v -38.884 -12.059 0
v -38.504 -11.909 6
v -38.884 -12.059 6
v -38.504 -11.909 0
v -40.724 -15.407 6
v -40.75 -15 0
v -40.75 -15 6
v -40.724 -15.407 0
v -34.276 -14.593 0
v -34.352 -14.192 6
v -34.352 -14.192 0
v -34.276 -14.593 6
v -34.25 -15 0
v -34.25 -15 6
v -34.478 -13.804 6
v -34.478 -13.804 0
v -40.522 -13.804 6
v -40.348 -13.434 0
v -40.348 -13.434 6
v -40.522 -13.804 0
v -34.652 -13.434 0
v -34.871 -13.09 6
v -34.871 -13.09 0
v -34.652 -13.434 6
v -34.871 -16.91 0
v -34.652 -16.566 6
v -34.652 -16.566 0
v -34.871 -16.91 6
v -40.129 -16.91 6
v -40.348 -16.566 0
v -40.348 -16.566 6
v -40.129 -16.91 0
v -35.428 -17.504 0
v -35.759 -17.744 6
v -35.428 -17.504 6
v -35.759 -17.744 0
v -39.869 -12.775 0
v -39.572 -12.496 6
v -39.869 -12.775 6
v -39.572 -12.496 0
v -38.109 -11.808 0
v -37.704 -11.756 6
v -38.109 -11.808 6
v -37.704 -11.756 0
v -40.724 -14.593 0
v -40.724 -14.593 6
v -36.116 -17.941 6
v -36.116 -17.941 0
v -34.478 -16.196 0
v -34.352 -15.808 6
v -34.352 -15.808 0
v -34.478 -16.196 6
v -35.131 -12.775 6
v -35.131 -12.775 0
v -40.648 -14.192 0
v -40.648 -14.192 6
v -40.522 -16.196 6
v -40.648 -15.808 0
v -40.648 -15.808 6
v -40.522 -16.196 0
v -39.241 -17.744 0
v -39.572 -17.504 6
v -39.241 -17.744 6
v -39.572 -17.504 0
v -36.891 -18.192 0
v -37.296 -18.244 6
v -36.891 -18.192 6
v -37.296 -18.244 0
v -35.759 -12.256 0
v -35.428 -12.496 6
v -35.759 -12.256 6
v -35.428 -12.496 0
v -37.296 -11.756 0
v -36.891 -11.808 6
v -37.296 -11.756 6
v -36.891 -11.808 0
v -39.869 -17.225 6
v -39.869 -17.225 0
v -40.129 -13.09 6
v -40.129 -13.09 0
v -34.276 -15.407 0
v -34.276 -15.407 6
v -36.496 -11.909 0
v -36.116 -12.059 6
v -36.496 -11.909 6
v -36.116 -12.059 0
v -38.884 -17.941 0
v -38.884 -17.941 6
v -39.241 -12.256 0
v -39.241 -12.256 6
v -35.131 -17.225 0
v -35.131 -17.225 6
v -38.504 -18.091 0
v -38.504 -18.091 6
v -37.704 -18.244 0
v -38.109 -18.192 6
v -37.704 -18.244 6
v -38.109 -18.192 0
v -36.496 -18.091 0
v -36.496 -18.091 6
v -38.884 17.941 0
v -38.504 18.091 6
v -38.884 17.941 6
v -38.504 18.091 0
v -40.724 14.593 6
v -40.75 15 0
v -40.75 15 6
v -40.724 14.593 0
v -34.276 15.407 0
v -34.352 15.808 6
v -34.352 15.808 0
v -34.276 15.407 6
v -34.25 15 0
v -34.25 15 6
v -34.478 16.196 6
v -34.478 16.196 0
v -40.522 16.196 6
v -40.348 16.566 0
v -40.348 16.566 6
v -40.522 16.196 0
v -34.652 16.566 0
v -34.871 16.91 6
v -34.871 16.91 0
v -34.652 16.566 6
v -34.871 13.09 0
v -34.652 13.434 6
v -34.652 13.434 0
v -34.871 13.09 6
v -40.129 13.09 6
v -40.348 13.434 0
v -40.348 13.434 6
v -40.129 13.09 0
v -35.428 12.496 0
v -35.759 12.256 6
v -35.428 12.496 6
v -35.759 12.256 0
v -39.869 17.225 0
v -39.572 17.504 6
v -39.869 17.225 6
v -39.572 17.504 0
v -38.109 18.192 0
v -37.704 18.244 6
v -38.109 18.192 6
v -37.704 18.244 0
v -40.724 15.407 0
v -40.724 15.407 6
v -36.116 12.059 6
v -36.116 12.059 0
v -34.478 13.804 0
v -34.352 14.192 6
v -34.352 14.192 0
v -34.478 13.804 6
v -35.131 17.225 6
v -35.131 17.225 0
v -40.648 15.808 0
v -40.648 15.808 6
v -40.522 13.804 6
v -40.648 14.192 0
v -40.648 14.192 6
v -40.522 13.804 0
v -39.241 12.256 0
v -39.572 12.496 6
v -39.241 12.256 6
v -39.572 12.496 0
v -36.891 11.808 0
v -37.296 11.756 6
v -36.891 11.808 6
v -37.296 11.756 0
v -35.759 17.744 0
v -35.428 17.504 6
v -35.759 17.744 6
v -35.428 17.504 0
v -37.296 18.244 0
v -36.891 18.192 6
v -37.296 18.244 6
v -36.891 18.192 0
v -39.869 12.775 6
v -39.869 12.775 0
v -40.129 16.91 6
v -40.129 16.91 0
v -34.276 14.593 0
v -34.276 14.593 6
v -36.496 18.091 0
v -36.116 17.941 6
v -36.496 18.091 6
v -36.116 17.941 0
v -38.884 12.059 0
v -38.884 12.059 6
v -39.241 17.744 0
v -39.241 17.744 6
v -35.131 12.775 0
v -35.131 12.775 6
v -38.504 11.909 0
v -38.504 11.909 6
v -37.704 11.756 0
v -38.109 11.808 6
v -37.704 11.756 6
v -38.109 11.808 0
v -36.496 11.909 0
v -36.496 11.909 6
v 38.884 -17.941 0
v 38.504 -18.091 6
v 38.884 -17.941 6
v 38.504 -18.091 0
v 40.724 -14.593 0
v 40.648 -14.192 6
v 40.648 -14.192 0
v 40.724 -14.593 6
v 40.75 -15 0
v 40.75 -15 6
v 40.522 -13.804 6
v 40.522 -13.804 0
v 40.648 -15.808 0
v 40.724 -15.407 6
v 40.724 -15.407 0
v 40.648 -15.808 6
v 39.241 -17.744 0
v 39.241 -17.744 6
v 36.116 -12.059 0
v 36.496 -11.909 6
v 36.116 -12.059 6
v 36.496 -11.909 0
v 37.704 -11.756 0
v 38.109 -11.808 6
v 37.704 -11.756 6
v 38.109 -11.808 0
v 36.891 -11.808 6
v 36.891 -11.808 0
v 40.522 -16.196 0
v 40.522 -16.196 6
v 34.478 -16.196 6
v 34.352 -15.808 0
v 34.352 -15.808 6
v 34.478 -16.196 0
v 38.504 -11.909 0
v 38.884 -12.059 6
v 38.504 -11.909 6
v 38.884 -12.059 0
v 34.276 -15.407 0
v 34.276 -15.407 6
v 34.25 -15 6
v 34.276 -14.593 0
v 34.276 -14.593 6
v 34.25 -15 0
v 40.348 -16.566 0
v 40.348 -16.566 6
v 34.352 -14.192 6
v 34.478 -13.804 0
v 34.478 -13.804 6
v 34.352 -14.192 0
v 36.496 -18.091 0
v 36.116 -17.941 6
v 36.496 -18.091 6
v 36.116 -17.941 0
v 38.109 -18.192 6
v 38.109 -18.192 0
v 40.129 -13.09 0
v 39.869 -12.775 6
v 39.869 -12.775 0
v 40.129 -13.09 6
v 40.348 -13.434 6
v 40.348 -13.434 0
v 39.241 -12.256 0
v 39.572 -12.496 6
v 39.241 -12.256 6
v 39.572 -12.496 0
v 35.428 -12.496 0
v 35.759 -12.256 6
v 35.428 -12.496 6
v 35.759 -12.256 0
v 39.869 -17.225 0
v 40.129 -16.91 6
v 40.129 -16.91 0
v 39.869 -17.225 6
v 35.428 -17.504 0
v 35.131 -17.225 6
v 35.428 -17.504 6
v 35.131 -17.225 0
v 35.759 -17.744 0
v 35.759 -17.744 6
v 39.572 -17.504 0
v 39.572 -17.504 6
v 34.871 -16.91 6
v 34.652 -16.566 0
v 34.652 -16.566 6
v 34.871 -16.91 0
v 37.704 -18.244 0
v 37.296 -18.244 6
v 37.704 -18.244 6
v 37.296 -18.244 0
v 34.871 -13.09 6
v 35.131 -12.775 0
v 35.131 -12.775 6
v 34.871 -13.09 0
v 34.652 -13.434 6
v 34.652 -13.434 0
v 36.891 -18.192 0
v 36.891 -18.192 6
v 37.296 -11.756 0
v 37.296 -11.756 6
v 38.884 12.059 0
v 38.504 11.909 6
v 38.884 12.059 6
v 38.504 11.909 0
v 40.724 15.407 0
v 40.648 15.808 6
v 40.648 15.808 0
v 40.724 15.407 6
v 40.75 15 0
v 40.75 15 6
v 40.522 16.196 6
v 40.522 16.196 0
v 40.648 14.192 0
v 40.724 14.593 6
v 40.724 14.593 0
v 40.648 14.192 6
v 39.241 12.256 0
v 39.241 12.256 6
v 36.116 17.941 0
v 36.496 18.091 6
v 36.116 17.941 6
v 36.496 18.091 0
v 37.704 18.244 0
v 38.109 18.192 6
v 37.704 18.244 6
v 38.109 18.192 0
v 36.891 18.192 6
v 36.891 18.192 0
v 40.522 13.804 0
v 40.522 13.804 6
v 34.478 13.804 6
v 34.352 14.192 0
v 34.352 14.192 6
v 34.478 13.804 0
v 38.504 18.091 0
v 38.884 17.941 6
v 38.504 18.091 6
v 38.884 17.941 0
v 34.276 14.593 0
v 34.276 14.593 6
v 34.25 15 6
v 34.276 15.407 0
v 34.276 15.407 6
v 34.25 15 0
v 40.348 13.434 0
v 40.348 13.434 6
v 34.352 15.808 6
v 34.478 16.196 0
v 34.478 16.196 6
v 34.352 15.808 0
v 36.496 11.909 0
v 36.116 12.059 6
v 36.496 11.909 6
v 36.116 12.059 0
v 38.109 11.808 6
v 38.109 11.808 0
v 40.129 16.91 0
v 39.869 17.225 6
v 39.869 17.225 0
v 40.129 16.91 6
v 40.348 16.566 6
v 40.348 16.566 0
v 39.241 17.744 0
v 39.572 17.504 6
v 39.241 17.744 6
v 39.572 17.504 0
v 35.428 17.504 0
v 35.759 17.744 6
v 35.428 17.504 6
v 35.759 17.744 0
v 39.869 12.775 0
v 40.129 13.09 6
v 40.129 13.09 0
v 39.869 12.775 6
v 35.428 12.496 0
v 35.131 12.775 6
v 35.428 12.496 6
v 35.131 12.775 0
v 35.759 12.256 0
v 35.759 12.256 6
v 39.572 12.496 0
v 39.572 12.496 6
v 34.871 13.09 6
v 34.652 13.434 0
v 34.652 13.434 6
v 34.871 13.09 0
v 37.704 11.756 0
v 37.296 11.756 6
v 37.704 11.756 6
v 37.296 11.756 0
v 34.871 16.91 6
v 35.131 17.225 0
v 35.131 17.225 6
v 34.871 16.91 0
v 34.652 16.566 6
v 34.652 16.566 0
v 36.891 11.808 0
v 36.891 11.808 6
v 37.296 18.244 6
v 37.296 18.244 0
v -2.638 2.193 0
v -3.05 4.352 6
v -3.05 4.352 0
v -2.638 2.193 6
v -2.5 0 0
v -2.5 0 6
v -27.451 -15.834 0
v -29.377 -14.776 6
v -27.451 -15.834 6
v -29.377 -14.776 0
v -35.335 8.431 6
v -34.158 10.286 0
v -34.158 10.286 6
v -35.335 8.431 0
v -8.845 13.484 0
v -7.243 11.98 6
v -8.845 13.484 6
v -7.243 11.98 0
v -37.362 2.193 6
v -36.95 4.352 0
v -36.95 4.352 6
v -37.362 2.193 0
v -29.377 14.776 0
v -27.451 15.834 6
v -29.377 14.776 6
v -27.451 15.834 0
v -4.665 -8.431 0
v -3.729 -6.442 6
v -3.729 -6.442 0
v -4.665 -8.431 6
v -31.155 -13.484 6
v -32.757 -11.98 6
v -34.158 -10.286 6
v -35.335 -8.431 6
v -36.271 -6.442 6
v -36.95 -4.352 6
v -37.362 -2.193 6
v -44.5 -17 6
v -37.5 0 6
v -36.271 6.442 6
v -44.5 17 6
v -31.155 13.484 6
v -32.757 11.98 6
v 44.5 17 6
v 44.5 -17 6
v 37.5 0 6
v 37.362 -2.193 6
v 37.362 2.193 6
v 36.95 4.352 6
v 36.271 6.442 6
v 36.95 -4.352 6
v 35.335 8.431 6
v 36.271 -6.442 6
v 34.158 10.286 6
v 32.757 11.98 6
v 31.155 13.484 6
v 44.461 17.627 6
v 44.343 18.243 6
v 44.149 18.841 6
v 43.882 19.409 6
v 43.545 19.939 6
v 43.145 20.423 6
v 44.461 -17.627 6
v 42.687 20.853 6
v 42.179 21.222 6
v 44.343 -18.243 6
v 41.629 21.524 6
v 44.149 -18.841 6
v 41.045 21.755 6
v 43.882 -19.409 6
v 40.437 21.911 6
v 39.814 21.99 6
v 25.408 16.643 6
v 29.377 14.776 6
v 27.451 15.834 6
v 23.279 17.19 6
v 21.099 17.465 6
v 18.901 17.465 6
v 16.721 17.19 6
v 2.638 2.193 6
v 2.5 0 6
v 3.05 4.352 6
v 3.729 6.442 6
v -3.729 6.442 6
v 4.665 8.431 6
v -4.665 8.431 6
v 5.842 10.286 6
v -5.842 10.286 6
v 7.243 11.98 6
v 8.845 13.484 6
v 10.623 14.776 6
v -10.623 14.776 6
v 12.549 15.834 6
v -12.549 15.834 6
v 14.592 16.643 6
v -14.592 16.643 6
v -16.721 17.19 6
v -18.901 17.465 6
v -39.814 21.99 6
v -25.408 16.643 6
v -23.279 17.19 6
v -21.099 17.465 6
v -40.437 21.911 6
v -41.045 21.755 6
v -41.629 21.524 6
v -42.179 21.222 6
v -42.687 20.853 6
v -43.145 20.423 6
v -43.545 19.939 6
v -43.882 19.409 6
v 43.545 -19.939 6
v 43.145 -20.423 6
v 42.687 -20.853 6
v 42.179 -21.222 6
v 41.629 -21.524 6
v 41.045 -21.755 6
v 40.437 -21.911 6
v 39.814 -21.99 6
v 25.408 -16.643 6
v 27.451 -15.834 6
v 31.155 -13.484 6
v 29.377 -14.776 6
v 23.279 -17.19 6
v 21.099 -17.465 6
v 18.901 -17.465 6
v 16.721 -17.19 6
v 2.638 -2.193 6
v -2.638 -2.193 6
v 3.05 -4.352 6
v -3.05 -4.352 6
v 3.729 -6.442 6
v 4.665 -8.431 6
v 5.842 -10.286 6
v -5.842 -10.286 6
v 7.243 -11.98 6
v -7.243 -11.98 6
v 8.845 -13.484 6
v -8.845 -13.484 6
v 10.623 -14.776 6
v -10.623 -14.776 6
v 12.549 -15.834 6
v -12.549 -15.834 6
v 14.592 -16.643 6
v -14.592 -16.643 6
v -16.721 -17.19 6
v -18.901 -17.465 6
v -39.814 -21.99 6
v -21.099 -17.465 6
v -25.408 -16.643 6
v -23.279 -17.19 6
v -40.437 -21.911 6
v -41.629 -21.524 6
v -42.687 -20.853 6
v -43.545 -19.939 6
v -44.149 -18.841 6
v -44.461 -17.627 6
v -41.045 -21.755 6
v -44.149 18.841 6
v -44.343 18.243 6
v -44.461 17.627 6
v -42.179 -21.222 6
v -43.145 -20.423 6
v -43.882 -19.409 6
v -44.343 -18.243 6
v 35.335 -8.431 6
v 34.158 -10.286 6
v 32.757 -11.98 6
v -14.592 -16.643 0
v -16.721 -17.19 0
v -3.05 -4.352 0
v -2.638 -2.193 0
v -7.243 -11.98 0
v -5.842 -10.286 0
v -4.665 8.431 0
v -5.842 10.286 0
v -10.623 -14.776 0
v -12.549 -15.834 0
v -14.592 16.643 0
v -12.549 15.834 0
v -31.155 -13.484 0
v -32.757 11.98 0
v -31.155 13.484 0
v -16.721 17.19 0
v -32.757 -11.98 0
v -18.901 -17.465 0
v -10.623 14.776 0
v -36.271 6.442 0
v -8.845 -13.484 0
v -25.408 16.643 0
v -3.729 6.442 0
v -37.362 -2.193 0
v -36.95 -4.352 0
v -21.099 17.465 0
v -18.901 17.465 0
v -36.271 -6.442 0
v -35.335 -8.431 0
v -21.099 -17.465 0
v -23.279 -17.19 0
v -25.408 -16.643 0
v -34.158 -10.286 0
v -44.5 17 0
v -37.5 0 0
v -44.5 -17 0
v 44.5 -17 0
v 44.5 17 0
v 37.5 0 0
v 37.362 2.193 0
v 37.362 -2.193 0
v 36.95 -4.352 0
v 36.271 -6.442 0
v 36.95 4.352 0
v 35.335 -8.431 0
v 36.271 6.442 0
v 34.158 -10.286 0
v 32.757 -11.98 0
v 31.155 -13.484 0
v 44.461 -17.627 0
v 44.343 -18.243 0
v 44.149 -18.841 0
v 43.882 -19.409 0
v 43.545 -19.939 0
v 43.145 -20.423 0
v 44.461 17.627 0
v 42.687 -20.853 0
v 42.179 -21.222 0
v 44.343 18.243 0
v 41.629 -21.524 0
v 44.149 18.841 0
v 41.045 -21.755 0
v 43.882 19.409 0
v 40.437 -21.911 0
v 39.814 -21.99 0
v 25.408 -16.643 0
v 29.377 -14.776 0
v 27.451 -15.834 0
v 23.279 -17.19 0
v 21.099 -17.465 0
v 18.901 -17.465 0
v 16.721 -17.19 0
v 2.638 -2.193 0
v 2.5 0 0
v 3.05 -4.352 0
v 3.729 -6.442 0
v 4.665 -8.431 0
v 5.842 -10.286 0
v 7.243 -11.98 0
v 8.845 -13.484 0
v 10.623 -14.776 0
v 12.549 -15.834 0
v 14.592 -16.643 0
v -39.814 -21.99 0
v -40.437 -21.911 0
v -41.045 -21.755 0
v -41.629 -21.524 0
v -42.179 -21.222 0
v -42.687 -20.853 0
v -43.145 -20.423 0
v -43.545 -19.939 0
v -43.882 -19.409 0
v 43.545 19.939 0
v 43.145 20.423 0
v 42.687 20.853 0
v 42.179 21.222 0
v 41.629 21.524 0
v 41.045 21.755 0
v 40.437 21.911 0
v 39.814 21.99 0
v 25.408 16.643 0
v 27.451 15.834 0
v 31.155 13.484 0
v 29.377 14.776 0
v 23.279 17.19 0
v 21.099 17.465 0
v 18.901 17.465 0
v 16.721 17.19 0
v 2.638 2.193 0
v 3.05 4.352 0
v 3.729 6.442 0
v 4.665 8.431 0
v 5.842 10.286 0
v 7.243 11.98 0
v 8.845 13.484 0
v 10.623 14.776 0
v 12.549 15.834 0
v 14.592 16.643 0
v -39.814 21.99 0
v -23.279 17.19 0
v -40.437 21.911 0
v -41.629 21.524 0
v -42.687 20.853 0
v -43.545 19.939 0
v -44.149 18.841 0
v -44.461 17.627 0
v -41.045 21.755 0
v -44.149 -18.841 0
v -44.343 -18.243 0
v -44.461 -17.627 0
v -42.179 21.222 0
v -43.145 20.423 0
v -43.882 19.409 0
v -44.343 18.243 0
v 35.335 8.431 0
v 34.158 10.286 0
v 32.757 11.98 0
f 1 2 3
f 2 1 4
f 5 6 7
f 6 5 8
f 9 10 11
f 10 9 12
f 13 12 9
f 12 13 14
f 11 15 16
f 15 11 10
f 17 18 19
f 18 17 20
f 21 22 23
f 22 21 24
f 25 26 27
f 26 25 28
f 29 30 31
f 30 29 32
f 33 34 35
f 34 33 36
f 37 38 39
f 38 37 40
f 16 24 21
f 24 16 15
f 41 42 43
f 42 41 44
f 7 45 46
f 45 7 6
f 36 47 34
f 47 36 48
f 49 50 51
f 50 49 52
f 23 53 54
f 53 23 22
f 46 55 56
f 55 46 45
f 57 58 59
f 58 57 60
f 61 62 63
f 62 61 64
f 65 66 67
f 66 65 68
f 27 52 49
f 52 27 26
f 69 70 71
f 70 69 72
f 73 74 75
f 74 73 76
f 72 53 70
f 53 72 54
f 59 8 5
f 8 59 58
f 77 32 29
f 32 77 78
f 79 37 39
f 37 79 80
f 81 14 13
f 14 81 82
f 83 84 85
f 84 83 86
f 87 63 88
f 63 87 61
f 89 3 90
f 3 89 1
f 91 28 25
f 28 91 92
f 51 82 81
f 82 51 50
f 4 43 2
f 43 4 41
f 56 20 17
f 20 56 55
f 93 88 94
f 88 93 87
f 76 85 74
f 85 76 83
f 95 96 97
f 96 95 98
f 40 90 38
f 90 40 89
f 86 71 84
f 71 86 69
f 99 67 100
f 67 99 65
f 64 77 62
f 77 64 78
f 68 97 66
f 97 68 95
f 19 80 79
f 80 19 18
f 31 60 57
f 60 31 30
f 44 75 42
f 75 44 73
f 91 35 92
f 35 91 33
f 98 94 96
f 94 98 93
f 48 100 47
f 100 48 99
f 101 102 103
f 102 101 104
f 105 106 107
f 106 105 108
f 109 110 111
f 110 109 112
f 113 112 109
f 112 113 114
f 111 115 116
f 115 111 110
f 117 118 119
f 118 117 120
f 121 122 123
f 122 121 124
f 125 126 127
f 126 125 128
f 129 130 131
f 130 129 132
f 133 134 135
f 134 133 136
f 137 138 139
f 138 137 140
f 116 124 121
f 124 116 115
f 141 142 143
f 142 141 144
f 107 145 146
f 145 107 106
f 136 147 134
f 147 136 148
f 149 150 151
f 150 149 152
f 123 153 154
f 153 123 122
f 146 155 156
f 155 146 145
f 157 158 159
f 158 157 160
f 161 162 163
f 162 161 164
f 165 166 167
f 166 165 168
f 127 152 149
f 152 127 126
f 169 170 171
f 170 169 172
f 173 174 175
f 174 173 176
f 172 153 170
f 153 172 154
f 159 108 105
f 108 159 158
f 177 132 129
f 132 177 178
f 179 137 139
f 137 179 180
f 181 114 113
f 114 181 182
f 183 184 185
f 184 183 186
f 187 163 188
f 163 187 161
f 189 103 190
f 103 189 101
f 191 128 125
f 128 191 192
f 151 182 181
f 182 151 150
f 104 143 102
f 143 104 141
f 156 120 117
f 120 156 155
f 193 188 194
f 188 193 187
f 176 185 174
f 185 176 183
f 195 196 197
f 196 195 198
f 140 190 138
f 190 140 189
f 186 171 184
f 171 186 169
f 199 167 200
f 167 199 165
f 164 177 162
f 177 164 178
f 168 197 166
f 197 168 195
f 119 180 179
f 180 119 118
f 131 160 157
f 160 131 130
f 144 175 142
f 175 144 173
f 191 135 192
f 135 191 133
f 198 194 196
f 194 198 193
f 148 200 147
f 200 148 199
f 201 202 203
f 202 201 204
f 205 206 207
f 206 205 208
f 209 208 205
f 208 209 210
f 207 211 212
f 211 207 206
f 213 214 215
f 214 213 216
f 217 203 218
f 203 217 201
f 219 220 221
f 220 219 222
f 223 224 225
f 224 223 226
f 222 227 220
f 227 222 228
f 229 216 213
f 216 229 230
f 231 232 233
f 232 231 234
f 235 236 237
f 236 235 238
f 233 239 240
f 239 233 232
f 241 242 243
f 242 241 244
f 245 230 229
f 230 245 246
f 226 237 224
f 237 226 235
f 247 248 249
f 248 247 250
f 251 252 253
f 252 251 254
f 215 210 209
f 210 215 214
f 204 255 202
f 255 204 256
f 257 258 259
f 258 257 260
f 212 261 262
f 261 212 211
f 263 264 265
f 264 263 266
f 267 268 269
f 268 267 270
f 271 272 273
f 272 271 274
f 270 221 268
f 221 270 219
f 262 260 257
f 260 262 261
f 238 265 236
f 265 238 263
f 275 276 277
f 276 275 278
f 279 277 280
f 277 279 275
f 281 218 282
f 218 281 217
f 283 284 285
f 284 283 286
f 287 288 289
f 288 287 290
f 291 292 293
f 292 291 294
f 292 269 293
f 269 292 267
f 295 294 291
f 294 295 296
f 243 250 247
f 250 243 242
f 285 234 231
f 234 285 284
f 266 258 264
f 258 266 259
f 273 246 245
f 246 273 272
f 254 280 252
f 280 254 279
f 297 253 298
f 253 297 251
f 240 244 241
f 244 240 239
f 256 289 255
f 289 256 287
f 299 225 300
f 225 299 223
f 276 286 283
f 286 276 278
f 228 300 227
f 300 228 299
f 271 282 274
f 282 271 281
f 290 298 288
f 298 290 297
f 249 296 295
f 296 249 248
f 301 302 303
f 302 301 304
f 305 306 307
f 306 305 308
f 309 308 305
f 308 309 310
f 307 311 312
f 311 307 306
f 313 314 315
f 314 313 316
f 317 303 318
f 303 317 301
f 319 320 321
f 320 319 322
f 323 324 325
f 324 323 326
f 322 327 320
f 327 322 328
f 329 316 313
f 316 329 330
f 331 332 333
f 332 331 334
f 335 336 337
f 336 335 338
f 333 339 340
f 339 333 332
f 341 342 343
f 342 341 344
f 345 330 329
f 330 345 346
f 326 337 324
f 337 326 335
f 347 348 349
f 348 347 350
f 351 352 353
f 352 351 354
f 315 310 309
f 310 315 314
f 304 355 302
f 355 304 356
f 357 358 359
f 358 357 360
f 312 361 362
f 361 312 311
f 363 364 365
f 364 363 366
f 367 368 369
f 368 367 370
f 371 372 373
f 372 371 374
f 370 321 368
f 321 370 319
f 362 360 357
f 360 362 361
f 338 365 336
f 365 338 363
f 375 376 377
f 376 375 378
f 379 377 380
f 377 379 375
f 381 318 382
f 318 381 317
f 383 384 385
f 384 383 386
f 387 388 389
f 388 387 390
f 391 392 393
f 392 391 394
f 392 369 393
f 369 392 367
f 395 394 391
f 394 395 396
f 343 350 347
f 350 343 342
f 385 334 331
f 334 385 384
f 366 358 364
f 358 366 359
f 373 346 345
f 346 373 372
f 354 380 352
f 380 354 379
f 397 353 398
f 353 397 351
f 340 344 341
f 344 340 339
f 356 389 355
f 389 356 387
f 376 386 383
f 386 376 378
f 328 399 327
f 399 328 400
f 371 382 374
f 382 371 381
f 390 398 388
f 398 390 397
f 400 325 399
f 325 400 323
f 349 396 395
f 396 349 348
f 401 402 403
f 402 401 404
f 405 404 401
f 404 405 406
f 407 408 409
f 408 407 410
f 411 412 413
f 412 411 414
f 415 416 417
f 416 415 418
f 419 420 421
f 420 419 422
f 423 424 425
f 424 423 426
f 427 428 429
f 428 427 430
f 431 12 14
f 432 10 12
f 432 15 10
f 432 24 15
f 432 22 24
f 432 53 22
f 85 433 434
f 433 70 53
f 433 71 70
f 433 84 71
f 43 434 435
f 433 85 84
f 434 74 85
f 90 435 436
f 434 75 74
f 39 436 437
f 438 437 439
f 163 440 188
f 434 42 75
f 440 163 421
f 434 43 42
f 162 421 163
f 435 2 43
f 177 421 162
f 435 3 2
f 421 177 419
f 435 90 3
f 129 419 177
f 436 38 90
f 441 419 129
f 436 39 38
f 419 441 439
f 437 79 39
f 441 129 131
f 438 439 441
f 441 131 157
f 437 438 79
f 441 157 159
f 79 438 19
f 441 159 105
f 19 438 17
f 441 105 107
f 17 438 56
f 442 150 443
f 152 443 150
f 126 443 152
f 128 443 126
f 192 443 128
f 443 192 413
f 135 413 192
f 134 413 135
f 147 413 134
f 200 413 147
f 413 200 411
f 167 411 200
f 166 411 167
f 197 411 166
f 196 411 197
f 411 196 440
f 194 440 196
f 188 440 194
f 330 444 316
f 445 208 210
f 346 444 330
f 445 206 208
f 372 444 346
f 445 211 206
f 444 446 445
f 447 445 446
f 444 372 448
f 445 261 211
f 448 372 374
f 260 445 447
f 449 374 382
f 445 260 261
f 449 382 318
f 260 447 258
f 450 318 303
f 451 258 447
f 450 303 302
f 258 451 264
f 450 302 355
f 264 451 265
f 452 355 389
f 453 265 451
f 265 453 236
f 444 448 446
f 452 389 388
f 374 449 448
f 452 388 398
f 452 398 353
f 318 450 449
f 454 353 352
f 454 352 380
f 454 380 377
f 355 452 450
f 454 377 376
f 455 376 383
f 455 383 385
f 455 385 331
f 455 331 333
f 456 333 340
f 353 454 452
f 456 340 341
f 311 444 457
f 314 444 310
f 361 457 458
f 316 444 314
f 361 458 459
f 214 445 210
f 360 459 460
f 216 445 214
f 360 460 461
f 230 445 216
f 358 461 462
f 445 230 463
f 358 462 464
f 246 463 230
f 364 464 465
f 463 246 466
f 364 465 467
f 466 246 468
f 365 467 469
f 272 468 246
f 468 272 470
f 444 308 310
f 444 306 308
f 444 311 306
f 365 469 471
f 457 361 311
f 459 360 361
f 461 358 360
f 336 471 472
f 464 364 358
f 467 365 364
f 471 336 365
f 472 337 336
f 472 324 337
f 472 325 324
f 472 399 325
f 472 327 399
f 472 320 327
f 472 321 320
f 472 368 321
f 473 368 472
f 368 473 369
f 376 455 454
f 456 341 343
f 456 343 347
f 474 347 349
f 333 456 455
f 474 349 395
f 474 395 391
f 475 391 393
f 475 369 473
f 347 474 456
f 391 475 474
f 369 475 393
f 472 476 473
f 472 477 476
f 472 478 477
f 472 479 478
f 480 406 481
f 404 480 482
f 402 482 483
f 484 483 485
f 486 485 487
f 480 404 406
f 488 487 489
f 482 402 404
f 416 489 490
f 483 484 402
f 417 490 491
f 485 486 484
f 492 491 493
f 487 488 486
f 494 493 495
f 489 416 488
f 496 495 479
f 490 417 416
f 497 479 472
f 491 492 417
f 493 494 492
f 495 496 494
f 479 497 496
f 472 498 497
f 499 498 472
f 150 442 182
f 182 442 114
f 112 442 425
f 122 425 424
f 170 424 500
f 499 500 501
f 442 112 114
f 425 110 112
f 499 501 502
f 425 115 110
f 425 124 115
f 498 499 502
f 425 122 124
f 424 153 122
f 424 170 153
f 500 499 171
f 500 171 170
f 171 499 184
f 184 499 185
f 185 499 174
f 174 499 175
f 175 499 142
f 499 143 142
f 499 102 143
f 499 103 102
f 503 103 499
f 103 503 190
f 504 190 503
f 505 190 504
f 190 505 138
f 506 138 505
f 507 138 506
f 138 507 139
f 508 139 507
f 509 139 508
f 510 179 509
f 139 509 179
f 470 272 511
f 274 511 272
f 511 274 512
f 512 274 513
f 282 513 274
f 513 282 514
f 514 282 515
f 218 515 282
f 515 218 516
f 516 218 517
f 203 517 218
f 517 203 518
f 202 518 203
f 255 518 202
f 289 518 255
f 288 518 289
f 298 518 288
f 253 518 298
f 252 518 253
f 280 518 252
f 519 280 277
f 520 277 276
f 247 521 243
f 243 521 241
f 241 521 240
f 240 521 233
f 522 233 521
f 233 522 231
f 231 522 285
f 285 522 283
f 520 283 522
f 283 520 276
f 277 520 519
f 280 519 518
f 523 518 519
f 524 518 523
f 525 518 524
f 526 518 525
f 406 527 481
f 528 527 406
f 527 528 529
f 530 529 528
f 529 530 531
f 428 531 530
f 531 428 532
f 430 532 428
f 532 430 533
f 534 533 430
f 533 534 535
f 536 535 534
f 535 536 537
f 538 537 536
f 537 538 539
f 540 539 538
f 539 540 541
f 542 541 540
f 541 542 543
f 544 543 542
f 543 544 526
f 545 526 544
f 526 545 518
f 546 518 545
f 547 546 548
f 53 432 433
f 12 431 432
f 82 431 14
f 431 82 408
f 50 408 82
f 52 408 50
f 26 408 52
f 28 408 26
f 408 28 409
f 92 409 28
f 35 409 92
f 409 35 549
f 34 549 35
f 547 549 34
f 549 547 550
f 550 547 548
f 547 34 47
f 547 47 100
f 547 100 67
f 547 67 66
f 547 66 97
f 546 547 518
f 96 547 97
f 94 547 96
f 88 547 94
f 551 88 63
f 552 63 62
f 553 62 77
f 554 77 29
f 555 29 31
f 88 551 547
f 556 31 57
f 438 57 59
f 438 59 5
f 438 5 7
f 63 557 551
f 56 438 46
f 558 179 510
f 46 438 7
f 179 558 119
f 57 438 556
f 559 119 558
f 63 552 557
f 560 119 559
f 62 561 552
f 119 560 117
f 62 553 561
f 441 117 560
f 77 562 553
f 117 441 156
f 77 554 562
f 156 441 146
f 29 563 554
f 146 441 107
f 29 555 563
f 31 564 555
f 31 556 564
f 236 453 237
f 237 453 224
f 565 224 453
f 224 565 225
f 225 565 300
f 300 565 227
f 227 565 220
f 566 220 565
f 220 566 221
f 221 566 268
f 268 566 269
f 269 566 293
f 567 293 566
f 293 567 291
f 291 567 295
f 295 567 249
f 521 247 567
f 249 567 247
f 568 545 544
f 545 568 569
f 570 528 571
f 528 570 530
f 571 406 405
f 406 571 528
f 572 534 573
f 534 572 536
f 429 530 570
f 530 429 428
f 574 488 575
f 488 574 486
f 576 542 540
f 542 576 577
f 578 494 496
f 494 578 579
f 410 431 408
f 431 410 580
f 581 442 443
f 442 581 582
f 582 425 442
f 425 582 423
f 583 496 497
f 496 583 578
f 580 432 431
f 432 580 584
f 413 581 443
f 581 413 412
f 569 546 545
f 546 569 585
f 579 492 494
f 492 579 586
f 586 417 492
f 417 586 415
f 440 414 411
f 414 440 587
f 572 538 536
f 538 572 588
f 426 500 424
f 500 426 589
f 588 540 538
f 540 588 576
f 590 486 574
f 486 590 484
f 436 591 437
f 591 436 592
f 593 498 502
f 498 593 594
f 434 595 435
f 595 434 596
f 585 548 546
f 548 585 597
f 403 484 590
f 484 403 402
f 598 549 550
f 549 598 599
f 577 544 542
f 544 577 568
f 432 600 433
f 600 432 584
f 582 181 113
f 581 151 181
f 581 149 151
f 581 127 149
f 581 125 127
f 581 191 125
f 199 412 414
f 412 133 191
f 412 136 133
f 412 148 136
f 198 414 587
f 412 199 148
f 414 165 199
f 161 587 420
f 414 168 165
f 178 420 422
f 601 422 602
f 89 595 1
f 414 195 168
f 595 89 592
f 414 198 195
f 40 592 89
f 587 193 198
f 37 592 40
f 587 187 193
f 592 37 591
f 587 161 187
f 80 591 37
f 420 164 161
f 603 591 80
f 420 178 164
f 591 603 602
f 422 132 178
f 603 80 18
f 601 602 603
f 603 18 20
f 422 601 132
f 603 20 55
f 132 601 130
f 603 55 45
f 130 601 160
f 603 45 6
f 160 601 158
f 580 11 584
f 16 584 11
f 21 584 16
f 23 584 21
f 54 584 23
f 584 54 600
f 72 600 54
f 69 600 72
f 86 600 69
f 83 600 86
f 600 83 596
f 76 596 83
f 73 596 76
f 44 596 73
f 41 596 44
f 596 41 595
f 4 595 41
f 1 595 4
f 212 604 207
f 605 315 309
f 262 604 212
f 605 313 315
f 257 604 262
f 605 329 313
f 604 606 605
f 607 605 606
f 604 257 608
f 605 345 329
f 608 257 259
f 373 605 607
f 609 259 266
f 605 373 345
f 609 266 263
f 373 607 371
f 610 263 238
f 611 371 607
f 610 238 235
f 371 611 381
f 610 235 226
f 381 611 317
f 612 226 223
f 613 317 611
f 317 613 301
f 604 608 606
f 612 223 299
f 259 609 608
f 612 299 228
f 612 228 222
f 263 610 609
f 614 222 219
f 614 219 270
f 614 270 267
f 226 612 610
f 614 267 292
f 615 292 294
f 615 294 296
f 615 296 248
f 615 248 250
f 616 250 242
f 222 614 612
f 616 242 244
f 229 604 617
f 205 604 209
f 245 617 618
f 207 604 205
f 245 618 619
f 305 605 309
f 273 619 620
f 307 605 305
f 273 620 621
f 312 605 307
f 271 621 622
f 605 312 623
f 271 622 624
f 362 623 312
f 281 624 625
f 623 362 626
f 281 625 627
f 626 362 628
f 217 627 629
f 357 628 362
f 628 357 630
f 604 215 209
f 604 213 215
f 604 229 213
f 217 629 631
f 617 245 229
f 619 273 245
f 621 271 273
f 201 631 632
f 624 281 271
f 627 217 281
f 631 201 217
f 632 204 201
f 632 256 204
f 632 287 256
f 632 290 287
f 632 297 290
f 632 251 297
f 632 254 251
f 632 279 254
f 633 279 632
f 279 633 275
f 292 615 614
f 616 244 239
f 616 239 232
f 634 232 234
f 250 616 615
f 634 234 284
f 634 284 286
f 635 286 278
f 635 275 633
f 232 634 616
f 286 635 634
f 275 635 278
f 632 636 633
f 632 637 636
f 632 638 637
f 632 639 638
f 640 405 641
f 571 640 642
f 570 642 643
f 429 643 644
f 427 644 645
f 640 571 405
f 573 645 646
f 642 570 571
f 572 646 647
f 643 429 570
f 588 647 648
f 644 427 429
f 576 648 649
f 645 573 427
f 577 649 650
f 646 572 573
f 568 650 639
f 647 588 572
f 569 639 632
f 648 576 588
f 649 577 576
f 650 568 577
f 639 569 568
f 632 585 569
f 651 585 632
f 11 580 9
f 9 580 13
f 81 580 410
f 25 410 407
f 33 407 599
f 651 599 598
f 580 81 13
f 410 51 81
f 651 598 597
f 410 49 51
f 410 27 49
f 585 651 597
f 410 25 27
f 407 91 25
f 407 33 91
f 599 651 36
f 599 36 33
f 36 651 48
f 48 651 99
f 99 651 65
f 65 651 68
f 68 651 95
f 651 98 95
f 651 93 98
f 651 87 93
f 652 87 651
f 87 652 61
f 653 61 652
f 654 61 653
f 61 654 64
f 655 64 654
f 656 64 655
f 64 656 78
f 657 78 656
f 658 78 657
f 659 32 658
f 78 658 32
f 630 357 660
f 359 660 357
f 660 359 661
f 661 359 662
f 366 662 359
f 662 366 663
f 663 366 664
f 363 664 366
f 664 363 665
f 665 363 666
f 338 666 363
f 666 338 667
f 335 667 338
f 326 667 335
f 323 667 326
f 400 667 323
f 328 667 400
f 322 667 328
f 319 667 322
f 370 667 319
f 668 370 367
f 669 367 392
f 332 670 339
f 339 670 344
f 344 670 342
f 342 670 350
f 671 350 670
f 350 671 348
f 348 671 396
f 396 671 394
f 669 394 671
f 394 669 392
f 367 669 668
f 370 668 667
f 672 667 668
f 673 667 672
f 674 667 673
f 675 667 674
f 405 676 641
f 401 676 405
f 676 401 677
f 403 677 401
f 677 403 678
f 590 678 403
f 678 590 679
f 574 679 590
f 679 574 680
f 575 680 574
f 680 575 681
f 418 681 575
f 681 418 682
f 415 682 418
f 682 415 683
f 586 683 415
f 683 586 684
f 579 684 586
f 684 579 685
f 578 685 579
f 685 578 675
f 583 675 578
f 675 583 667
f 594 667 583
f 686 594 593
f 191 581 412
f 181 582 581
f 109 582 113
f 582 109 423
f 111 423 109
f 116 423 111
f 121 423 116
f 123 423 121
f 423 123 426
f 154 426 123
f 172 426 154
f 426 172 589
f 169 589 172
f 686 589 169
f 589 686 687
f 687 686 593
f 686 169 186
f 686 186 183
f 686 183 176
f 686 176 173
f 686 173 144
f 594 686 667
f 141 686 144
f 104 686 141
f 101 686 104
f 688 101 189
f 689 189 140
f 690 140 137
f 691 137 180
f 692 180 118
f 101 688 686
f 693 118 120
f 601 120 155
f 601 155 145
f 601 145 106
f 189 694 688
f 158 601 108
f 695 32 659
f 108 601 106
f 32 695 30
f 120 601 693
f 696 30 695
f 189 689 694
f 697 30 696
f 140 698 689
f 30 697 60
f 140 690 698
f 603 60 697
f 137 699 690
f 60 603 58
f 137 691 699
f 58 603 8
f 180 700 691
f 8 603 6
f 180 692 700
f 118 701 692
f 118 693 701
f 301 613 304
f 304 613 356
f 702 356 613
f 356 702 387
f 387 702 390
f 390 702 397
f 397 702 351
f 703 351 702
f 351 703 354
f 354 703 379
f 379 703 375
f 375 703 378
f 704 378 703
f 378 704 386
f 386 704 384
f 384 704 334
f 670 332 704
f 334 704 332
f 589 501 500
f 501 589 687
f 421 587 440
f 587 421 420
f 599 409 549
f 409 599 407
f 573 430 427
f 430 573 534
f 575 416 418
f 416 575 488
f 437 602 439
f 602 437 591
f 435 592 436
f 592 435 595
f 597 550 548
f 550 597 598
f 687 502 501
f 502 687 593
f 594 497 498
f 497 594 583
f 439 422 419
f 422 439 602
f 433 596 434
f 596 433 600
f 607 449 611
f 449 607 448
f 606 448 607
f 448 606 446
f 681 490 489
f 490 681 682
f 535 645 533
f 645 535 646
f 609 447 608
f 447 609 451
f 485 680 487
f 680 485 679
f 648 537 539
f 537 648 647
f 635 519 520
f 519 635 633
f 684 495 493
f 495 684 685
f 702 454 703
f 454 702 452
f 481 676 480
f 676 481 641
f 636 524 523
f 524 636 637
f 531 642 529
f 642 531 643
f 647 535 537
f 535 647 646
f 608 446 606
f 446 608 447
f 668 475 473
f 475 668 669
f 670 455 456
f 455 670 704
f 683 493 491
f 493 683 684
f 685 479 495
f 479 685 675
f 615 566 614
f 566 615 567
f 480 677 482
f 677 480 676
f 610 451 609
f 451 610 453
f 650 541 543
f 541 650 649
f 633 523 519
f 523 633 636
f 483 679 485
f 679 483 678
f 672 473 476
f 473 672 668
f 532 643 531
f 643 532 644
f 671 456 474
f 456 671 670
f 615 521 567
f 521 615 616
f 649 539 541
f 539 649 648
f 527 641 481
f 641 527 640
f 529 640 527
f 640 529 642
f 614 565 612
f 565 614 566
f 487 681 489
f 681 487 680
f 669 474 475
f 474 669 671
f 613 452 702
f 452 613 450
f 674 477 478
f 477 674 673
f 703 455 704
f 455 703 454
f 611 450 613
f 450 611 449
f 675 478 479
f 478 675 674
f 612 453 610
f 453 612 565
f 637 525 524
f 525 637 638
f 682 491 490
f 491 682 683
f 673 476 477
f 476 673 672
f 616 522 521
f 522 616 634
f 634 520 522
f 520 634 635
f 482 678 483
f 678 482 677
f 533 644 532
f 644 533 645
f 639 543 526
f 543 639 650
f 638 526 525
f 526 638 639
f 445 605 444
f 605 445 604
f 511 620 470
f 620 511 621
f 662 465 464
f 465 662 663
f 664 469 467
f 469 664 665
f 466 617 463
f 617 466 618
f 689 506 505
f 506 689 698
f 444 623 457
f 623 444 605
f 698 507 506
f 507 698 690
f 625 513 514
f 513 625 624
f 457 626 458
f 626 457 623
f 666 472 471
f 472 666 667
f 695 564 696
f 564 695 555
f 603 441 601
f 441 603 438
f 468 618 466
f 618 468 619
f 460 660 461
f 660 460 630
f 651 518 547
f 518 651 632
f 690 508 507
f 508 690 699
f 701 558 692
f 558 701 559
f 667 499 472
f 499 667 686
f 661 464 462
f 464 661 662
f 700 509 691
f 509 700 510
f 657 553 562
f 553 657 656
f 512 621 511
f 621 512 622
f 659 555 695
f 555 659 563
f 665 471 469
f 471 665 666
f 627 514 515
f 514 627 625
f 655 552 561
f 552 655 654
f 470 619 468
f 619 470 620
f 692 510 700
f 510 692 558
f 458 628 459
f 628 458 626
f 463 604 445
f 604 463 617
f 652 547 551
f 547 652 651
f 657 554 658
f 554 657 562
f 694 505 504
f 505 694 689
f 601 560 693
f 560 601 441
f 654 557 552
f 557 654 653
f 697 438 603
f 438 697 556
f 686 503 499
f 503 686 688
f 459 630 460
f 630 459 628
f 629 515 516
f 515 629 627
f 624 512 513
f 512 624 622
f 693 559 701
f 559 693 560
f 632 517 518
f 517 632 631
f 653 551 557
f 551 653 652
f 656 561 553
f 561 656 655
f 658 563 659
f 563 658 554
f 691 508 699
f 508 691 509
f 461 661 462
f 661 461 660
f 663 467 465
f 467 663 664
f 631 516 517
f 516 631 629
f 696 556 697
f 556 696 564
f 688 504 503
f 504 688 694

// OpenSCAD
$fn = 50;

difference() {
	union() {
		hull() {
			translate(v = [-39.5, 17.0, 0]) {
				cylinder(h = 6, r = 5);
			}
			translate(v = [39.5, 17.0, 0]) {
				cylinder(h = 6, r = 5);
			}
			translate(v = [-39.5, -17.0, 0]) {
				cylinder(h = 6, r = 5);
			}
			translate(v = [39.5, -17.0, 0]) {
				cylinder(h = 6, r = 5);
			}
		}
	}
	union() {
		translate(v = [-37.5, -15.0, -100.0]) {
			cylinder(h = 200, r = 3.25);
		}
		translate(v = [-37.5, 15.0, -100.0]) {
			cylinder(h = 200, r = 3.25);
		}
		translate(v = [37.5, -15.0, -100.0]) {
			cylinder(h = 200, r = 3.25);
		}
		translate(v = [37.5, 15.0, -100.0]) {
			cylinder(h = 200, r = 3.25);
		}
		translate(v = [-37.5, -15.0, -100.0]) {
			cylinder(h = 200, r = 1.8);
		}
		translate(v = [-37.5, 15.0, -100.0]) {
			cylinder(h = 200, r = 1.8);
		}
		translate(v = [37.5, -15.0, -100.0]) {
			cylinder(h = 200, r = 1.8);
		}
		translate(v = [37.5, 15.0, -100.0]) {
			cylinder(h = 200, r = 1.8);
		}
		translate(v = [-20.0, 0, 0.0]) {
			cylinder(h = 6, r = 17.5);
		}
		translate(v = [20.0, 0, 0.0]) {
			cylinder(h = 6, r = 17.5);
		}
	}
}
